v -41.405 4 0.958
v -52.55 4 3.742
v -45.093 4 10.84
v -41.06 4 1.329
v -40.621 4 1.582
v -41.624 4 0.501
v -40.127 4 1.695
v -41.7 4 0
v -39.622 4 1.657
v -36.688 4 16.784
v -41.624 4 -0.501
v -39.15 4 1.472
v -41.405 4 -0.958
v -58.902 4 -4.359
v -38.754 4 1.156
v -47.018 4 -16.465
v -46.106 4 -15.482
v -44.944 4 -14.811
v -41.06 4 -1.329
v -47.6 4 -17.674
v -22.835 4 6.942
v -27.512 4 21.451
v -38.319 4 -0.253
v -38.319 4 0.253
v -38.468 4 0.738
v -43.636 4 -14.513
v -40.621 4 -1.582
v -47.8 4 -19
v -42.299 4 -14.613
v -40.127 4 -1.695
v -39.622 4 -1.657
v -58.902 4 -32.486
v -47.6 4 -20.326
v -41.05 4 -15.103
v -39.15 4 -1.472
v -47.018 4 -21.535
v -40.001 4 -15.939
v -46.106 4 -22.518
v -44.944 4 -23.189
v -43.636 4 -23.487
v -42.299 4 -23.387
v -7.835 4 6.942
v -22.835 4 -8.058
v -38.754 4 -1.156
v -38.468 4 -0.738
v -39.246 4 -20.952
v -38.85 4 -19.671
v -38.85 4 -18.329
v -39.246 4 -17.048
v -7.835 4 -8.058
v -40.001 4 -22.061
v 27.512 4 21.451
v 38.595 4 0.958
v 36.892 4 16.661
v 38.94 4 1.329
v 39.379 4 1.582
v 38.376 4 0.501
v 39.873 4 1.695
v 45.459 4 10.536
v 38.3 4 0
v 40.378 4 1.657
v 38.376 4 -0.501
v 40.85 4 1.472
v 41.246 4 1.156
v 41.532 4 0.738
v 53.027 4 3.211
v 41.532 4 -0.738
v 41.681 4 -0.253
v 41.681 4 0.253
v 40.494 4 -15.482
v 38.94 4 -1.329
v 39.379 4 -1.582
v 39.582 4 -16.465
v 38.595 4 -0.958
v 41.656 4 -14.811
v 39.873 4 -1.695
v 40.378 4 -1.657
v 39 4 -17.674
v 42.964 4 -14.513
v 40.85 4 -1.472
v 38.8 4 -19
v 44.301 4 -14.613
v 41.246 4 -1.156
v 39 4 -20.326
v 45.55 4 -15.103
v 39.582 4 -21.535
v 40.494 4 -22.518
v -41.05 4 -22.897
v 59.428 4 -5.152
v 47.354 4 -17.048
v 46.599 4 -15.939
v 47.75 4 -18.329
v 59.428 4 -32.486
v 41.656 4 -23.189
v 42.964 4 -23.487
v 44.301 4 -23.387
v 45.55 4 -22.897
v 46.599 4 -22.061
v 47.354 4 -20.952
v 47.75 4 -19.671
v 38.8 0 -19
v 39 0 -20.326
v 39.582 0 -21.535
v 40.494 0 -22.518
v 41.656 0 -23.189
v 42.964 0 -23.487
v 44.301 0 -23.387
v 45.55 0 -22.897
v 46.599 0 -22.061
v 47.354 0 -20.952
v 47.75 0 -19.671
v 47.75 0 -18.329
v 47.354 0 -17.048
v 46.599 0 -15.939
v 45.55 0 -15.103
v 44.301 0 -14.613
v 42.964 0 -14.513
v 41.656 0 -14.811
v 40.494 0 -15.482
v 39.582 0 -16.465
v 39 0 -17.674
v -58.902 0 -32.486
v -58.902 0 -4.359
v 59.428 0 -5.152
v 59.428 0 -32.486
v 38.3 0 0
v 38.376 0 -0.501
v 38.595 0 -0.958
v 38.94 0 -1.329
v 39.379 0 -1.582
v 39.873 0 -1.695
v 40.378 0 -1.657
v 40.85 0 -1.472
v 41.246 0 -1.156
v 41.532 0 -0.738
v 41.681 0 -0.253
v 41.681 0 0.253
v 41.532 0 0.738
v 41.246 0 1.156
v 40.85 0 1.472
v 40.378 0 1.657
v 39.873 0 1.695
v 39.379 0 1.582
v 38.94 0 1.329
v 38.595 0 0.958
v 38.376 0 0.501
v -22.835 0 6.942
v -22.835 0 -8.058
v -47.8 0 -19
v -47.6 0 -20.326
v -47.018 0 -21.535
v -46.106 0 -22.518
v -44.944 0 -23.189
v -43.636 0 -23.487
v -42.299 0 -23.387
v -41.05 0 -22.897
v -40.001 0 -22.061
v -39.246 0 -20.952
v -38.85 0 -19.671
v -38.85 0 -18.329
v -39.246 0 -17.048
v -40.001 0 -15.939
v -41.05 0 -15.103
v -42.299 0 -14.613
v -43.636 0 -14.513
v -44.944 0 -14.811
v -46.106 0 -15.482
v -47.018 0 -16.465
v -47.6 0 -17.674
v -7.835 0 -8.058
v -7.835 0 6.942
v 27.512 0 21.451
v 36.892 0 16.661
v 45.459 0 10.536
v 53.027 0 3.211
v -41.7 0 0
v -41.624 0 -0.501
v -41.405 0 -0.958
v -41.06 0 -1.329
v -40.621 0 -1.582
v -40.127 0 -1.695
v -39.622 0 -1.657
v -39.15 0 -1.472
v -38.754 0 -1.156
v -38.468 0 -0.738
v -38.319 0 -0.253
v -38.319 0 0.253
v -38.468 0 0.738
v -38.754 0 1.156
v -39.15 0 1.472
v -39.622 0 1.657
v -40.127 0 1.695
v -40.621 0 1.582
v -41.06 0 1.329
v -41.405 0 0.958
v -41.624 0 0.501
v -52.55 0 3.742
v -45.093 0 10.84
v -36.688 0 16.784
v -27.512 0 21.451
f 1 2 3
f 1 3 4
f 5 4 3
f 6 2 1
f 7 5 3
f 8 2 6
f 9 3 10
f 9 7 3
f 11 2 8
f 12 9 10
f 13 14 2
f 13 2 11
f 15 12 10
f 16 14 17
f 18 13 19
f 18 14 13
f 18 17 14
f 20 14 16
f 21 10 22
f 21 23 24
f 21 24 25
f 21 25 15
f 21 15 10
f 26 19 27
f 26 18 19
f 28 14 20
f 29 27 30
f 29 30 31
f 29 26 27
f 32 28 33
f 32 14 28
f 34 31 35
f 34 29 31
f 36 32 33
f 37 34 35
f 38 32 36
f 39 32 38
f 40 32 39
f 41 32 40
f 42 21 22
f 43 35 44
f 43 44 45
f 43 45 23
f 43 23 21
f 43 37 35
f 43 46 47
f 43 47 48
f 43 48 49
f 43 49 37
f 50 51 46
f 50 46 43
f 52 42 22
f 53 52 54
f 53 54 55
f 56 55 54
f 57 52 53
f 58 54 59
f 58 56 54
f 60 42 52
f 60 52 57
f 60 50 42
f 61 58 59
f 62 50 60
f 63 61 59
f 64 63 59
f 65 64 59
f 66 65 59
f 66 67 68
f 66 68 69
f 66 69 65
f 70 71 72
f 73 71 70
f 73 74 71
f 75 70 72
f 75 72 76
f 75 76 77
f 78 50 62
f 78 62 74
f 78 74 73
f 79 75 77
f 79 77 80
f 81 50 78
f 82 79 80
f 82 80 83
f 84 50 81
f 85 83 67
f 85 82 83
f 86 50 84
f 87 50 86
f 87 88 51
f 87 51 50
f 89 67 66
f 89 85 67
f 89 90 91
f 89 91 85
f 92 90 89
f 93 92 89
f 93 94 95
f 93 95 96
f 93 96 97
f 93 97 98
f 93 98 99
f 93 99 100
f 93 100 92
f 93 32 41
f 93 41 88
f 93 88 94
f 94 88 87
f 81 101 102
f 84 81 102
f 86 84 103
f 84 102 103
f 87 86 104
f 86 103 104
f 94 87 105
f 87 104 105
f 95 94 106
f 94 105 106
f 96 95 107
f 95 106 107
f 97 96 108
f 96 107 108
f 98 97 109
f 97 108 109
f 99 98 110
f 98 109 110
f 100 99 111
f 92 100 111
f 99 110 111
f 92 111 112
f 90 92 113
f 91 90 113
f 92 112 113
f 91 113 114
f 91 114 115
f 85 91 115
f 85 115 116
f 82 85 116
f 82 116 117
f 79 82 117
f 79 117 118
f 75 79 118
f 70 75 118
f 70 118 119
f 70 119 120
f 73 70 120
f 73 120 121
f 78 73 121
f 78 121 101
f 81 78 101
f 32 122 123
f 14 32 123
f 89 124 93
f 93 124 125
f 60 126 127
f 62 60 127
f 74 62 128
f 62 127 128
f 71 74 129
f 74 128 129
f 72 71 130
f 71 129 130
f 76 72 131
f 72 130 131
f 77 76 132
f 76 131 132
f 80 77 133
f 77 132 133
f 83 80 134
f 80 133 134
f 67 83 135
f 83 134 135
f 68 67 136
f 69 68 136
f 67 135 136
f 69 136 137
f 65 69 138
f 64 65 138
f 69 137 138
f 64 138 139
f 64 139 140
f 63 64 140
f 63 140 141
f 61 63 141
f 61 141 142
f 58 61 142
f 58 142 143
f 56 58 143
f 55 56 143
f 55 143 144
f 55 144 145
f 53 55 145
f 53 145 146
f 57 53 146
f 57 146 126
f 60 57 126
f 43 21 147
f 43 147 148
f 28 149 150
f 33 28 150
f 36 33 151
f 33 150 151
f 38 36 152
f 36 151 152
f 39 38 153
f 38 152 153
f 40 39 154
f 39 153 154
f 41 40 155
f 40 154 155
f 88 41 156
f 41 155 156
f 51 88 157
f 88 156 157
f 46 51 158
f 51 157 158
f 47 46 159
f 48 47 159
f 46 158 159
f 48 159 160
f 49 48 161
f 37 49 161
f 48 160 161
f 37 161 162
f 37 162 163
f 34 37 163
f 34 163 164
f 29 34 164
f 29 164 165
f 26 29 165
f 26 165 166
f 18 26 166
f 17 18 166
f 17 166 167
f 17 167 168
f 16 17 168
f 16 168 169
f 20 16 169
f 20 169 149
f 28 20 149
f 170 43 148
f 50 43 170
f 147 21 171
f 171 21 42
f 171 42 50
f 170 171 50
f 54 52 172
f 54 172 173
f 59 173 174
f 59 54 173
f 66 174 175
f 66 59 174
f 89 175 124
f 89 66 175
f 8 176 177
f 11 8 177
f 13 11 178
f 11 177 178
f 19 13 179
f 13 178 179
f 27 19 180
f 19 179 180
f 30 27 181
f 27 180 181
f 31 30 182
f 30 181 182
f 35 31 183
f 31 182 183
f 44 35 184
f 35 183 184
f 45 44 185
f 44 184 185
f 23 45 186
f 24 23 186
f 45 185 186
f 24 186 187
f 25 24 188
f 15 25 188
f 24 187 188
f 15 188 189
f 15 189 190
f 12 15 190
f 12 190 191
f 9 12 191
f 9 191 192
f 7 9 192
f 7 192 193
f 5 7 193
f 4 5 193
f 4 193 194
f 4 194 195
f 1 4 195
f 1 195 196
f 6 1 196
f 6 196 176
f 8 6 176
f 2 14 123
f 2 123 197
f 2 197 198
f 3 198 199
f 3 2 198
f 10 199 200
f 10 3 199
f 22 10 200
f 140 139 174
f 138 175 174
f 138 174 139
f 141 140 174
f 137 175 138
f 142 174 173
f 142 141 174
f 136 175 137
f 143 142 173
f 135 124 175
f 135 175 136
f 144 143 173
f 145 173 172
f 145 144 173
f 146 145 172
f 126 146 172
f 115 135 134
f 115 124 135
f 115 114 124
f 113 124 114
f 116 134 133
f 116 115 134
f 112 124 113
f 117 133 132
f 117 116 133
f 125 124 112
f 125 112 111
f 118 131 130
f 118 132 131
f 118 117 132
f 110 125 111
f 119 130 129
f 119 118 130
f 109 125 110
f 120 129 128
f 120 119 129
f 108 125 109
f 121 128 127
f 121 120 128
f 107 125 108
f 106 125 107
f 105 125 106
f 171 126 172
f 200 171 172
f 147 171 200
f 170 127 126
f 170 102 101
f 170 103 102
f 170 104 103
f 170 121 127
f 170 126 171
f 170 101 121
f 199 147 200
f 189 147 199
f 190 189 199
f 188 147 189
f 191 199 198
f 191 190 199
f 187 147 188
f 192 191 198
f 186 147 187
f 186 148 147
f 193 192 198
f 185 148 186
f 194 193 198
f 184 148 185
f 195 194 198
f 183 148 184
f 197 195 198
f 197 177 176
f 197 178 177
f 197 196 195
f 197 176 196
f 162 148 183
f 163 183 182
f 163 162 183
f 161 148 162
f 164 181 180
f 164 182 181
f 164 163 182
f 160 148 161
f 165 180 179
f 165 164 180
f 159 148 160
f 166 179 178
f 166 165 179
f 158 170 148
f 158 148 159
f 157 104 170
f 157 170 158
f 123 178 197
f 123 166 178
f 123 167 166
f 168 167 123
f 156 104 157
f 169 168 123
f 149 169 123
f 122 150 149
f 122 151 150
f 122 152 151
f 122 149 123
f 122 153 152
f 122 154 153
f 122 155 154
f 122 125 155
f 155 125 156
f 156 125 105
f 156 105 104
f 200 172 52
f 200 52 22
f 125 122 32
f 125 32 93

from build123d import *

# Parameters (mm, degrees)
ESQUISSE1_W             = 63
ESQUISSE1_H             = 25
BOSS_EXTRU_1_DEPTH      = 4
D_GAGEMENT_M81_D        = 9
ESQUISSE5_R             = 96
ESQUISSE5_R_2           = 71
ENL_V_MAT_EXTRU_1_DEPTH = 68.845644546
ESQUISSE6_W             = 63
ESQUISSE6_H             = 25
BOSS_EXTRU_2_DEPTH      = 4
ESQUISSE7_W             = 15
ESQUISSE7_H             = 15
ENL_V_MAT_EXTRU_2_DEPTH = 68.845644546
D_GAGEMENT_M31_D        = 3.4


with BuildPart() as part:
    # Esquisse1 → Boss.-Extru.1 (new body)
    with BuildSketch(Plane(origin=(0, 0, 0), x_dir=(1, 0, 0), z_dir=(0, 1, 0))):
        Polygon((-58.901607841, 6.711500167), (-58.901607841, 32.486170288), (59.427941441, 32.486170288), (59.427941441, 7.487213227), (59.427941441, -21.450828615), (-58.901607841, -21.450828615), align=None)
        Rectangle(ESQUISSE1_W, ESQUISSE1_H, mode=Mode.SUBTRACT)
    extrude(amount=BOSS_EXTRU_1_DEPTH)

    # Dégagement M81 (through all)
    with Locations(Plane(origin=(0, 4, 0), x_dir=(1, 0, 0), z_dir=(0, 1, 0))):
        with Locations((-43.3, 19), (43.3, 19)):
            Hole(D_GAGEMENT_M81_D / 2)

    # Esquisse5 → Enlèv. mat.-Extru.1 (cut, through all)
    with BuildSketch(Plane(origin=(0, 4, 0), x_dir=(1, 0, 0), z_dir=(0, 1, 0))):
        with Locations((0, 44.002199903)):
            Circle(ESQUISSE5_R)
        with Locations((0, 44.002199903)):
            Circle(ESQUISSE5_R_2, mode=Mode.SUBTRACT)
    extrude(amount=-ENL_V_MAT_EXTRU_1_DEPTH, mode=Mode.SUBTRACT)

    # Esquisse6 → Boss.-Extru.2 (add)
    with BuildSketch(Plane(origin=(0, 4, 0), x_dir=(1, 0, 0), z_dir=(0, 1, 0))):
        Rectangle(ESQUISSE6_W, ESQUISSE6_H)
    extrude(amount=-BOSS_EXTRU_2_DEPTH)

    # Esquisse7 → Enlèv. mat.-Extru.2 (cut, through all)
    with BuildSketch(Plane(origin=(0, 4, 0), x_dir=(1, 0, 0), z_dir=(0, 1, 0))):
        with Locations((-15.335187954, 0.557700645)):
            Rectangle(ESQUISSE7_W, ESQUISSE7_H)
    extrude(amount=-ENL_V_MAT_EXTRU_2_DEPTH, mode=Mode.SUBTRACT)

    # Dégagement M31 (through all)
    with Locations(Plane(origin=(0, 4, 0), x_dir=(1, 0, 0), z_dir=(0, 1, 0))):
        with Locations((-40, 0), (40, 0)):
            Hole(D_GAGEMENT_M31_D / 2)


solid = part.part
